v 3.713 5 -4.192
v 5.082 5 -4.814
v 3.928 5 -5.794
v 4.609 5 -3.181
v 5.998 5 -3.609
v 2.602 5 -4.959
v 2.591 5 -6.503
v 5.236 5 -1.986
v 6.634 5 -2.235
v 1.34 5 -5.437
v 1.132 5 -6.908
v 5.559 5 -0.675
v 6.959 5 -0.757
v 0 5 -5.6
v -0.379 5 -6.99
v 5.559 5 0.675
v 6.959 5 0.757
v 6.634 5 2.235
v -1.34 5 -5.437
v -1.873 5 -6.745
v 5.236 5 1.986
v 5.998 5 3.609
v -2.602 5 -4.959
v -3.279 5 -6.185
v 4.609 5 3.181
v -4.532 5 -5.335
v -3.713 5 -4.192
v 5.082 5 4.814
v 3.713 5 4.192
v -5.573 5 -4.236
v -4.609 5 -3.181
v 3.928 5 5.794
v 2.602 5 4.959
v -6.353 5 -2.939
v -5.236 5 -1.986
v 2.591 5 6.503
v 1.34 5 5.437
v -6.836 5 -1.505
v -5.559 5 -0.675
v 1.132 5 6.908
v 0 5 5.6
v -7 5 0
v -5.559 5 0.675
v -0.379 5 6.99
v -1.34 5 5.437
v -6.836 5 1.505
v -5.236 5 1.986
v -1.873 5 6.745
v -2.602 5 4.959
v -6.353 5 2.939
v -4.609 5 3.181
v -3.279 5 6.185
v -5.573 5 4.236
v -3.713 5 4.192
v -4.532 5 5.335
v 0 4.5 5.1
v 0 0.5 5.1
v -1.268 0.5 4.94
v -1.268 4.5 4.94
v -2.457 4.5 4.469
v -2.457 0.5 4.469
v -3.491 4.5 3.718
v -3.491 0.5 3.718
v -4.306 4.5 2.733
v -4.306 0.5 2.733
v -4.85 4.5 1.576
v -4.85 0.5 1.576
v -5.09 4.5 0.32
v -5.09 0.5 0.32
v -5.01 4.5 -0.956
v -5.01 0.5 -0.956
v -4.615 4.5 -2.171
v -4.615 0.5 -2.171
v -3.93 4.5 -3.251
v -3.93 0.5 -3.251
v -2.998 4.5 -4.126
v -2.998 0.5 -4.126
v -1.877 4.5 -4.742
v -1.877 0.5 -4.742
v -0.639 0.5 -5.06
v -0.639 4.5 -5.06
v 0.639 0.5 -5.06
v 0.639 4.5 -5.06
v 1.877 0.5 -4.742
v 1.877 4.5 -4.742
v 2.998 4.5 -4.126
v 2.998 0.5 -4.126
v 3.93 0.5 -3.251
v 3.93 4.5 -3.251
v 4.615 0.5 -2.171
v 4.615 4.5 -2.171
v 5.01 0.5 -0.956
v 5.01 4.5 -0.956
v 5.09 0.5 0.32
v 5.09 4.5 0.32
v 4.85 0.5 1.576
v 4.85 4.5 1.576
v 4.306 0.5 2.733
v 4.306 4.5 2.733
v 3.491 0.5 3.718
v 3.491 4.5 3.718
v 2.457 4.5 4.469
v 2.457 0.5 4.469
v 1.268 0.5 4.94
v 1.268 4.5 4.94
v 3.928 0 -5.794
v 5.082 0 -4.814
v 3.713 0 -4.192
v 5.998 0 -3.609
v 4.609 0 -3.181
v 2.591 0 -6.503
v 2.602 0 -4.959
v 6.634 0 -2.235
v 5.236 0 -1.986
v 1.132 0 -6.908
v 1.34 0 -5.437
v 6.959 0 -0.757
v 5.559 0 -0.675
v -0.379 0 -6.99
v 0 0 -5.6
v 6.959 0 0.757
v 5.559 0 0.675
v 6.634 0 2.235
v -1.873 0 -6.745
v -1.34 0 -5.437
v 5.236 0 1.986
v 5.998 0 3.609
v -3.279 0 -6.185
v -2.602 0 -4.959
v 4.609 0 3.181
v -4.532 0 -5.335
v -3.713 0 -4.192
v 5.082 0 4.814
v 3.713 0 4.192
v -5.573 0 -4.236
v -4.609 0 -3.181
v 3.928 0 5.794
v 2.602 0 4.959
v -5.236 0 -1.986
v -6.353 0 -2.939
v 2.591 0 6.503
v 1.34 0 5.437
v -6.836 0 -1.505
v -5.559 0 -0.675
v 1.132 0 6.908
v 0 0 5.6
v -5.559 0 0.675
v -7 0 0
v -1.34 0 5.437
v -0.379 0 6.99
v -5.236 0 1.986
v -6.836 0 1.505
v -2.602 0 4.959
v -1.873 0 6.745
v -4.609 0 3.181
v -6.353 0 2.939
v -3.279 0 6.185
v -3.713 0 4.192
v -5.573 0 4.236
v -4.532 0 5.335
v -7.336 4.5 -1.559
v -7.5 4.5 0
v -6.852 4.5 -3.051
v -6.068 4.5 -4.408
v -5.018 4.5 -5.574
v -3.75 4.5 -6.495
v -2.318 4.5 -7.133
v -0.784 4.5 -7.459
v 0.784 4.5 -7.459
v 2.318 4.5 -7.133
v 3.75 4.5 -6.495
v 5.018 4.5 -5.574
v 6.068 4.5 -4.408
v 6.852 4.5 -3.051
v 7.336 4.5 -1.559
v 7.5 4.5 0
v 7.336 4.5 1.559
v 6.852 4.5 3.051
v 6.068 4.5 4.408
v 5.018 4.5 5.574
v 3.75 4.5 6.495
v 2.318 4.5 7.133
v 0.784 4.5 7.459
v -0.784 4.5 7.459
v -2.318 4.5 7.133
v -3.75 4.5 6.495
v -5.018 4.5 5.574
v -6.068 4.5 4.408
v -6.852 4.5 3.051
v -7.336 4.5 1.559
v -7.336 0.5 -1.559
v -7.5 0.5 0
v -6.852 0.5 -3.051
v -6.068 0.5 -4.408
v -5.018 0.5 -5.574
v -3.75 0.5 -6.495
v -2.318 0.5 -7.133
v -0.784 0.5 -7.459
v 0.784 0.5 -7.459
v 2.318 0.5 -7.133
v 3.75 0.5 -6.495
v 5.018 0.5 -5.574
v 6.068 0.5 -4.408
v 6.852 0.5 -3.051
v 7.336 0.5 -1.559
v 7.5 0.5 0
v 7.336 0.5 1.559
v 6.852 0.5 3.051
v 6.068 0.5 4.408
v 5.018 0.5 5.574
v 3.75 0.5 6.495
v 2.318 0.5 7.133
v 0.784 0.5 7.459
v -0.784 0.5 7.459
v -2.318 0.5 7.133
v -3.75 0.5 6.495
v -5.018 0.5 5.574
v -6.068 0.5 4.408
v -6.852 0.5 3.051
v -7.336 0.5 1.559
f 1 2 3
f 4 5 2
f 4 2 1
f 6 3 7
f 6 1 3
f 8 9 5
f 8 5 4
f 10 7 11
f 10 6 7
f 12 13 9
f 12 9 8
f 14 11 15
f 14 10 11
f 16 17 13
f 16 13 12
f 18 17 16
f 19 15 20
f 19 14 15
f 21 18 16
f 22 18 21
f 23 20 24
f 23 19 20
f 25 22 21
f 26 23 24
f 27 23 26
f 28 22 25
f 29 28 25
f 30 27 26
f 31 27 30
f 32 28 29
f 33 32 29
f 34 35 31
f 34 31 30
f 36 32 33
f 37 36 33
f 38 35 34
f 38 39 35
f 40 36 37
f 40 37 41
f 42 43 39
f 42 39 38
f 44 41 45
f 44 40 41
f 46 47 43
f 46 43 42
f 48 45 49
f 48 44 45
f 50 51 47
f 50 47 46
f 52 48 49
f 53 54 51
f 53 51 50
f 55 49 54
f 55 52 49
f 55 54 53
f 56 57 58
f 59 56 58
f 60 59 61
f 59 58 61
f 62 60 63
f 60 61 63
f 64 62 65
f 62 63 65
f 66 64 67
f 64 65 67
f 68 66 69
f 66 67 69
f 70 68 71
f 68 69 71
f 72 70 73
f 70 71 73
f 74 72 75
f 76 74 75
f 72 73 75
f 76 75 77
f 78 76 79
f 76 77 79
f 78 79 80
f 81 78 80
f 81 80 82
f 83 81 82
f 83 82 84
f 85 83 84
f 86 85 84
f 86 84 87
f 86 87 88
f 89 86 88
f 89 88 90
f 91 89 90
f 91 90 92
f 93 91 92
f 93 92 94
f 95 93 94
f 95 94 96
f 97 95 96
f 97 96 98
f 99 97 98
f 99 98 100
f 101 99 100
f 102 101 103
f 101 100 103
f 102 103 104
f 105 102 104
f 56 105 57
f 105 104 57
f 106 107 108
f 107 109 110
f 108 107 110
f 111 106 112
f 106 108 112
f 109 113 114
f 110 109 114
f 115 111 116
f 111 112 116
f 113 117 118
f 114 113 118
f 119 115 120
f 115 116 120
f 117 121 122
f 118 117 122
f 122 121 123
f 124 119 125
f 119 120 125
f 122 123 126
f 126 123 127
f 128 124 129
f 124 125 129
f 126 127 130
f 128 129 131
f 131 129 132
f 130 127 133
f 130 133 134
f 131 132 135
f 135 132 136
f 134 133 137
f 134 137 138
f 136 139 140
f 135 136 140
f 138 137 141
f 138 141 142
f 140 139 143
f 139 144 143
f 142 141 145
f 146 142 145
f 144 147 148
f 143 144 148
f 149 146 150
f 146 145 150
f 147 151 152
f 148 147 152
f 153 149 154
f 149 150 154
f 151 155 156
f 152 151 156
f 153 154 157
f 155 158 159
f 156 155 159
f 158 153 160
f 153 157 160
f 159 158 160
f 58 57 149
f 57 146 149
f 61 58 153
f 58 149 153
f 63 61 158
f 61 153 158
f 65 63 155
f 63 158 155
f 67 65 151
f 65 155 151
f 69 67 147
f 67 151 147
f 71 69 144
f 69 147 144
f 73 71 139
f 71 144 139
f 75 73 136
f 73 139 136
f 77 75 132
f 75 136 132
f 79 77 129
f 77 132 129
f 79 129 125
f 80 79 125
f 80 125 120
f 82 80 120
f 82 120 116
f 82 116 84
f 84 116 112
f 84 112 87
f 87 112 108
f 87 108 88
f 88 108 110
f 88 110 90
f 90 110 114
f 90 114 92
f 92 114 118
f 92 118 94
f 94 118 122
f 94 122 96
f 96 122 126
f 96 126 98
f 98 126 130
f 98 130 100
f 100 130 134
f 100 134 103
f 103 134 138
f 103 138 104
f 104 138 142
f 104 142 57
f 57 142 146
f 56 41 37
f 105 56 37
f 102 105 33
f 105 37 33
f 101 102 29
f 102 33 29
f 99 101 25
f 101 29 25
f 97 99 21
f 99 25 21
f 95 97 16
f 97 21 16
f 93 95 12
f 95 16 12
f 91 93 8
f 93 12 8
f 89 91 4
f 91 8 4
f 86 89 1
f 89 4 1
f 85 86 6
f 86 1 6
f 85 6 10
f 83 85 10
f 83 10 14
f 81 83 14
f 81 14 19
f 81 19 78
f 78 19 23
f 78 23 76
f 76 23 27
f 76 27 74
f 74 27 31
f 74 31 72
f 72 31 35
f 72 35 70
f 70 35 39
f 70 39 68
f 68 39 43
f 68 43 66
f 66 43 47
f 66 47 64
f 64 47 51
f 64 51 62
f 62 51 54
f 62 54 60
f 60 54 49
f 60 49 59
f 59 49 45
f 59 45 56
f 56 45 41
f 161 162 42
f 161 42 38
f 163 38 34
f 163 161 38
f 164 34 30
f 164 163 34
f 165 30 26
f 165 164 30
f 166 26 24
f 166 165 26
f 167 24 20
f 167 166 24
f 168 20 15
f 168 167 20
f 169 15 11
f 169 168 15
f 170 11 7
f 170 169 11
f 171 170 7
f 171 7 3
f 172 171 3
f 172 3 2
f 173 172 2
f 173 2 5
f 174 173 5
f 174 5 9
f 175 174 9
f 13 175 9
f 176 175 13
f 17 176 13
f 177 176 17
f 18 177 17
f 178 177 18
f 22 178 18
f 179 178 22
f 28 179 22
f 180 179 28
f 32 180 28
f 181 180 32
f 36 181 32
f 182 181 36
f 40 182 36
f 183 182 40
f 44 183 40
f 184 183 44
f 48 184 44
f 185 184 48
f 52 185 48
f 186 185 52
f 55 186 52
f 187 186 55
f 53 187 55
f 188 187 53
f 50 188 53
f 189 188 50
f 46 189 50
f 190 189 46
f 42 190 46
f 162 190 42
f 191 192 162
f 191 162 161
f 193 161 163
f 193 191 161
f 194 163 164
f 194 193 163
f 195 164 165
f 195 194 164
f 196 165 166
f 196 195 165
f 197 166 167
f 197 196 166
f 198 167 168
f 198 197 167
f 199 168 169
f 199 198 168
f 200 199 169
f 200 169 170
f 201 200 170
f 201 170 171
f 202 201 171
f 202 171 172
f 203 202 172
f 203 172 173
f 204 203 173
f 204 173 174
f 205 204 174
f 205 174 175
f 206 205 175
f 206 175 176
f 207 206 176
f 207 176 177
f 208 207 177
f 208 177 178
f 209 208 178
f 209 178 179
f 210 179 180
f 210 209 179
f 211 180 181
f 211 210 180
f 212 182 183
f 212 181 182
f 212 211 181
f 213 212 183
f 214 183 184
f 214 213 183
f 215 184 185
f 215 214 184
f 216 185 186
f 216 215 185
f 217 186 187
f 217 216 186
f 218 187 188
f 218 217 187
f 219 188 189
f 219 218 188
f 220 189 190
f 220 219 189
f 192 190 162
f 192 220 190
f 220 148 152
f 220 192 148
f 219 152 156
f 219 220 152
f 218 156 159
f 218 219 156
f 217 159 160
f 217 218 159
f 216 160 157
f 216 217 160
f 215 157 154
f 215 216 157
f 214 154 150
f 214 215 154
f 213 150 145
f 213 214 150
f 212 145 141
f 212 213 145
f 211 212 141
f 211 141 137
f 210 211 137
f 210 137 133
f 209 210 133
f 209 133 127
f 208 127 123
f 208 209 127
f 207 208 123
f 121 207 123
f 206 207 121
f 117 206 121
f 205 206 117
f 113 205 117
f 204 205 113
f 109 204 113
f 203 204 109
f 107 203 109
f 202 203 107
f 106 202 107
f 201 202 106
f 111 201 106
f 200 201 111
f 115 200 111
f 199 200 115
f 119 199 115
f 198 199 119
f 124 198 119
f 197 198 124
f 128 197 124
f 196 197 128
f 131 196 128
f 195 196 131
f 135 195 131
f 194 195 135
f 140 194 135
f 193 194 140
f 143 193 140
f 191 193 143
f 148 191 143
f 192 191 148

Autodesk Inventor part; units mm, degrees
ref_plane "YZ Plane" through (0, 0, 0) normal (1, 0, 0) x (0, 1, 0)
ref_plane "XZ Plane" through (0, 0, 0) normal (0, 1, 0) x (-1, 0, 0)
ref_plane "XY Plane" through (0, 0, 0) normal (0, 0, 1) x (1, 0, 0)
sketch "Sketch1" plane through (0, 0, 0) normal (0, 1, 0) x (-1, 0, 0)
  circle A0 centre (0, 0) radius 7.5
  dimension "d0" = 15
extrude "Extrusion1" add sketch "Sketch1" along normal blind 5
sketch "Sketch2" plane through (0, 5, 0) normal (0, 1, 0) x (1, 0, 0)
  point P0 (0, 0)
  point P1 (0, 0)
hole "Hole1" at (0, 5, 0) direction (0, -1, 0) diameter 10.2 end through all
chamfer "Chamfer1" distance 0.5 angle 45 4 edges at (7.5, 5, 0) (0, 5, -5.1) (0, 0, -5.1) (7.5, 0, 0)
properties part number "Case Bottom Ring"
